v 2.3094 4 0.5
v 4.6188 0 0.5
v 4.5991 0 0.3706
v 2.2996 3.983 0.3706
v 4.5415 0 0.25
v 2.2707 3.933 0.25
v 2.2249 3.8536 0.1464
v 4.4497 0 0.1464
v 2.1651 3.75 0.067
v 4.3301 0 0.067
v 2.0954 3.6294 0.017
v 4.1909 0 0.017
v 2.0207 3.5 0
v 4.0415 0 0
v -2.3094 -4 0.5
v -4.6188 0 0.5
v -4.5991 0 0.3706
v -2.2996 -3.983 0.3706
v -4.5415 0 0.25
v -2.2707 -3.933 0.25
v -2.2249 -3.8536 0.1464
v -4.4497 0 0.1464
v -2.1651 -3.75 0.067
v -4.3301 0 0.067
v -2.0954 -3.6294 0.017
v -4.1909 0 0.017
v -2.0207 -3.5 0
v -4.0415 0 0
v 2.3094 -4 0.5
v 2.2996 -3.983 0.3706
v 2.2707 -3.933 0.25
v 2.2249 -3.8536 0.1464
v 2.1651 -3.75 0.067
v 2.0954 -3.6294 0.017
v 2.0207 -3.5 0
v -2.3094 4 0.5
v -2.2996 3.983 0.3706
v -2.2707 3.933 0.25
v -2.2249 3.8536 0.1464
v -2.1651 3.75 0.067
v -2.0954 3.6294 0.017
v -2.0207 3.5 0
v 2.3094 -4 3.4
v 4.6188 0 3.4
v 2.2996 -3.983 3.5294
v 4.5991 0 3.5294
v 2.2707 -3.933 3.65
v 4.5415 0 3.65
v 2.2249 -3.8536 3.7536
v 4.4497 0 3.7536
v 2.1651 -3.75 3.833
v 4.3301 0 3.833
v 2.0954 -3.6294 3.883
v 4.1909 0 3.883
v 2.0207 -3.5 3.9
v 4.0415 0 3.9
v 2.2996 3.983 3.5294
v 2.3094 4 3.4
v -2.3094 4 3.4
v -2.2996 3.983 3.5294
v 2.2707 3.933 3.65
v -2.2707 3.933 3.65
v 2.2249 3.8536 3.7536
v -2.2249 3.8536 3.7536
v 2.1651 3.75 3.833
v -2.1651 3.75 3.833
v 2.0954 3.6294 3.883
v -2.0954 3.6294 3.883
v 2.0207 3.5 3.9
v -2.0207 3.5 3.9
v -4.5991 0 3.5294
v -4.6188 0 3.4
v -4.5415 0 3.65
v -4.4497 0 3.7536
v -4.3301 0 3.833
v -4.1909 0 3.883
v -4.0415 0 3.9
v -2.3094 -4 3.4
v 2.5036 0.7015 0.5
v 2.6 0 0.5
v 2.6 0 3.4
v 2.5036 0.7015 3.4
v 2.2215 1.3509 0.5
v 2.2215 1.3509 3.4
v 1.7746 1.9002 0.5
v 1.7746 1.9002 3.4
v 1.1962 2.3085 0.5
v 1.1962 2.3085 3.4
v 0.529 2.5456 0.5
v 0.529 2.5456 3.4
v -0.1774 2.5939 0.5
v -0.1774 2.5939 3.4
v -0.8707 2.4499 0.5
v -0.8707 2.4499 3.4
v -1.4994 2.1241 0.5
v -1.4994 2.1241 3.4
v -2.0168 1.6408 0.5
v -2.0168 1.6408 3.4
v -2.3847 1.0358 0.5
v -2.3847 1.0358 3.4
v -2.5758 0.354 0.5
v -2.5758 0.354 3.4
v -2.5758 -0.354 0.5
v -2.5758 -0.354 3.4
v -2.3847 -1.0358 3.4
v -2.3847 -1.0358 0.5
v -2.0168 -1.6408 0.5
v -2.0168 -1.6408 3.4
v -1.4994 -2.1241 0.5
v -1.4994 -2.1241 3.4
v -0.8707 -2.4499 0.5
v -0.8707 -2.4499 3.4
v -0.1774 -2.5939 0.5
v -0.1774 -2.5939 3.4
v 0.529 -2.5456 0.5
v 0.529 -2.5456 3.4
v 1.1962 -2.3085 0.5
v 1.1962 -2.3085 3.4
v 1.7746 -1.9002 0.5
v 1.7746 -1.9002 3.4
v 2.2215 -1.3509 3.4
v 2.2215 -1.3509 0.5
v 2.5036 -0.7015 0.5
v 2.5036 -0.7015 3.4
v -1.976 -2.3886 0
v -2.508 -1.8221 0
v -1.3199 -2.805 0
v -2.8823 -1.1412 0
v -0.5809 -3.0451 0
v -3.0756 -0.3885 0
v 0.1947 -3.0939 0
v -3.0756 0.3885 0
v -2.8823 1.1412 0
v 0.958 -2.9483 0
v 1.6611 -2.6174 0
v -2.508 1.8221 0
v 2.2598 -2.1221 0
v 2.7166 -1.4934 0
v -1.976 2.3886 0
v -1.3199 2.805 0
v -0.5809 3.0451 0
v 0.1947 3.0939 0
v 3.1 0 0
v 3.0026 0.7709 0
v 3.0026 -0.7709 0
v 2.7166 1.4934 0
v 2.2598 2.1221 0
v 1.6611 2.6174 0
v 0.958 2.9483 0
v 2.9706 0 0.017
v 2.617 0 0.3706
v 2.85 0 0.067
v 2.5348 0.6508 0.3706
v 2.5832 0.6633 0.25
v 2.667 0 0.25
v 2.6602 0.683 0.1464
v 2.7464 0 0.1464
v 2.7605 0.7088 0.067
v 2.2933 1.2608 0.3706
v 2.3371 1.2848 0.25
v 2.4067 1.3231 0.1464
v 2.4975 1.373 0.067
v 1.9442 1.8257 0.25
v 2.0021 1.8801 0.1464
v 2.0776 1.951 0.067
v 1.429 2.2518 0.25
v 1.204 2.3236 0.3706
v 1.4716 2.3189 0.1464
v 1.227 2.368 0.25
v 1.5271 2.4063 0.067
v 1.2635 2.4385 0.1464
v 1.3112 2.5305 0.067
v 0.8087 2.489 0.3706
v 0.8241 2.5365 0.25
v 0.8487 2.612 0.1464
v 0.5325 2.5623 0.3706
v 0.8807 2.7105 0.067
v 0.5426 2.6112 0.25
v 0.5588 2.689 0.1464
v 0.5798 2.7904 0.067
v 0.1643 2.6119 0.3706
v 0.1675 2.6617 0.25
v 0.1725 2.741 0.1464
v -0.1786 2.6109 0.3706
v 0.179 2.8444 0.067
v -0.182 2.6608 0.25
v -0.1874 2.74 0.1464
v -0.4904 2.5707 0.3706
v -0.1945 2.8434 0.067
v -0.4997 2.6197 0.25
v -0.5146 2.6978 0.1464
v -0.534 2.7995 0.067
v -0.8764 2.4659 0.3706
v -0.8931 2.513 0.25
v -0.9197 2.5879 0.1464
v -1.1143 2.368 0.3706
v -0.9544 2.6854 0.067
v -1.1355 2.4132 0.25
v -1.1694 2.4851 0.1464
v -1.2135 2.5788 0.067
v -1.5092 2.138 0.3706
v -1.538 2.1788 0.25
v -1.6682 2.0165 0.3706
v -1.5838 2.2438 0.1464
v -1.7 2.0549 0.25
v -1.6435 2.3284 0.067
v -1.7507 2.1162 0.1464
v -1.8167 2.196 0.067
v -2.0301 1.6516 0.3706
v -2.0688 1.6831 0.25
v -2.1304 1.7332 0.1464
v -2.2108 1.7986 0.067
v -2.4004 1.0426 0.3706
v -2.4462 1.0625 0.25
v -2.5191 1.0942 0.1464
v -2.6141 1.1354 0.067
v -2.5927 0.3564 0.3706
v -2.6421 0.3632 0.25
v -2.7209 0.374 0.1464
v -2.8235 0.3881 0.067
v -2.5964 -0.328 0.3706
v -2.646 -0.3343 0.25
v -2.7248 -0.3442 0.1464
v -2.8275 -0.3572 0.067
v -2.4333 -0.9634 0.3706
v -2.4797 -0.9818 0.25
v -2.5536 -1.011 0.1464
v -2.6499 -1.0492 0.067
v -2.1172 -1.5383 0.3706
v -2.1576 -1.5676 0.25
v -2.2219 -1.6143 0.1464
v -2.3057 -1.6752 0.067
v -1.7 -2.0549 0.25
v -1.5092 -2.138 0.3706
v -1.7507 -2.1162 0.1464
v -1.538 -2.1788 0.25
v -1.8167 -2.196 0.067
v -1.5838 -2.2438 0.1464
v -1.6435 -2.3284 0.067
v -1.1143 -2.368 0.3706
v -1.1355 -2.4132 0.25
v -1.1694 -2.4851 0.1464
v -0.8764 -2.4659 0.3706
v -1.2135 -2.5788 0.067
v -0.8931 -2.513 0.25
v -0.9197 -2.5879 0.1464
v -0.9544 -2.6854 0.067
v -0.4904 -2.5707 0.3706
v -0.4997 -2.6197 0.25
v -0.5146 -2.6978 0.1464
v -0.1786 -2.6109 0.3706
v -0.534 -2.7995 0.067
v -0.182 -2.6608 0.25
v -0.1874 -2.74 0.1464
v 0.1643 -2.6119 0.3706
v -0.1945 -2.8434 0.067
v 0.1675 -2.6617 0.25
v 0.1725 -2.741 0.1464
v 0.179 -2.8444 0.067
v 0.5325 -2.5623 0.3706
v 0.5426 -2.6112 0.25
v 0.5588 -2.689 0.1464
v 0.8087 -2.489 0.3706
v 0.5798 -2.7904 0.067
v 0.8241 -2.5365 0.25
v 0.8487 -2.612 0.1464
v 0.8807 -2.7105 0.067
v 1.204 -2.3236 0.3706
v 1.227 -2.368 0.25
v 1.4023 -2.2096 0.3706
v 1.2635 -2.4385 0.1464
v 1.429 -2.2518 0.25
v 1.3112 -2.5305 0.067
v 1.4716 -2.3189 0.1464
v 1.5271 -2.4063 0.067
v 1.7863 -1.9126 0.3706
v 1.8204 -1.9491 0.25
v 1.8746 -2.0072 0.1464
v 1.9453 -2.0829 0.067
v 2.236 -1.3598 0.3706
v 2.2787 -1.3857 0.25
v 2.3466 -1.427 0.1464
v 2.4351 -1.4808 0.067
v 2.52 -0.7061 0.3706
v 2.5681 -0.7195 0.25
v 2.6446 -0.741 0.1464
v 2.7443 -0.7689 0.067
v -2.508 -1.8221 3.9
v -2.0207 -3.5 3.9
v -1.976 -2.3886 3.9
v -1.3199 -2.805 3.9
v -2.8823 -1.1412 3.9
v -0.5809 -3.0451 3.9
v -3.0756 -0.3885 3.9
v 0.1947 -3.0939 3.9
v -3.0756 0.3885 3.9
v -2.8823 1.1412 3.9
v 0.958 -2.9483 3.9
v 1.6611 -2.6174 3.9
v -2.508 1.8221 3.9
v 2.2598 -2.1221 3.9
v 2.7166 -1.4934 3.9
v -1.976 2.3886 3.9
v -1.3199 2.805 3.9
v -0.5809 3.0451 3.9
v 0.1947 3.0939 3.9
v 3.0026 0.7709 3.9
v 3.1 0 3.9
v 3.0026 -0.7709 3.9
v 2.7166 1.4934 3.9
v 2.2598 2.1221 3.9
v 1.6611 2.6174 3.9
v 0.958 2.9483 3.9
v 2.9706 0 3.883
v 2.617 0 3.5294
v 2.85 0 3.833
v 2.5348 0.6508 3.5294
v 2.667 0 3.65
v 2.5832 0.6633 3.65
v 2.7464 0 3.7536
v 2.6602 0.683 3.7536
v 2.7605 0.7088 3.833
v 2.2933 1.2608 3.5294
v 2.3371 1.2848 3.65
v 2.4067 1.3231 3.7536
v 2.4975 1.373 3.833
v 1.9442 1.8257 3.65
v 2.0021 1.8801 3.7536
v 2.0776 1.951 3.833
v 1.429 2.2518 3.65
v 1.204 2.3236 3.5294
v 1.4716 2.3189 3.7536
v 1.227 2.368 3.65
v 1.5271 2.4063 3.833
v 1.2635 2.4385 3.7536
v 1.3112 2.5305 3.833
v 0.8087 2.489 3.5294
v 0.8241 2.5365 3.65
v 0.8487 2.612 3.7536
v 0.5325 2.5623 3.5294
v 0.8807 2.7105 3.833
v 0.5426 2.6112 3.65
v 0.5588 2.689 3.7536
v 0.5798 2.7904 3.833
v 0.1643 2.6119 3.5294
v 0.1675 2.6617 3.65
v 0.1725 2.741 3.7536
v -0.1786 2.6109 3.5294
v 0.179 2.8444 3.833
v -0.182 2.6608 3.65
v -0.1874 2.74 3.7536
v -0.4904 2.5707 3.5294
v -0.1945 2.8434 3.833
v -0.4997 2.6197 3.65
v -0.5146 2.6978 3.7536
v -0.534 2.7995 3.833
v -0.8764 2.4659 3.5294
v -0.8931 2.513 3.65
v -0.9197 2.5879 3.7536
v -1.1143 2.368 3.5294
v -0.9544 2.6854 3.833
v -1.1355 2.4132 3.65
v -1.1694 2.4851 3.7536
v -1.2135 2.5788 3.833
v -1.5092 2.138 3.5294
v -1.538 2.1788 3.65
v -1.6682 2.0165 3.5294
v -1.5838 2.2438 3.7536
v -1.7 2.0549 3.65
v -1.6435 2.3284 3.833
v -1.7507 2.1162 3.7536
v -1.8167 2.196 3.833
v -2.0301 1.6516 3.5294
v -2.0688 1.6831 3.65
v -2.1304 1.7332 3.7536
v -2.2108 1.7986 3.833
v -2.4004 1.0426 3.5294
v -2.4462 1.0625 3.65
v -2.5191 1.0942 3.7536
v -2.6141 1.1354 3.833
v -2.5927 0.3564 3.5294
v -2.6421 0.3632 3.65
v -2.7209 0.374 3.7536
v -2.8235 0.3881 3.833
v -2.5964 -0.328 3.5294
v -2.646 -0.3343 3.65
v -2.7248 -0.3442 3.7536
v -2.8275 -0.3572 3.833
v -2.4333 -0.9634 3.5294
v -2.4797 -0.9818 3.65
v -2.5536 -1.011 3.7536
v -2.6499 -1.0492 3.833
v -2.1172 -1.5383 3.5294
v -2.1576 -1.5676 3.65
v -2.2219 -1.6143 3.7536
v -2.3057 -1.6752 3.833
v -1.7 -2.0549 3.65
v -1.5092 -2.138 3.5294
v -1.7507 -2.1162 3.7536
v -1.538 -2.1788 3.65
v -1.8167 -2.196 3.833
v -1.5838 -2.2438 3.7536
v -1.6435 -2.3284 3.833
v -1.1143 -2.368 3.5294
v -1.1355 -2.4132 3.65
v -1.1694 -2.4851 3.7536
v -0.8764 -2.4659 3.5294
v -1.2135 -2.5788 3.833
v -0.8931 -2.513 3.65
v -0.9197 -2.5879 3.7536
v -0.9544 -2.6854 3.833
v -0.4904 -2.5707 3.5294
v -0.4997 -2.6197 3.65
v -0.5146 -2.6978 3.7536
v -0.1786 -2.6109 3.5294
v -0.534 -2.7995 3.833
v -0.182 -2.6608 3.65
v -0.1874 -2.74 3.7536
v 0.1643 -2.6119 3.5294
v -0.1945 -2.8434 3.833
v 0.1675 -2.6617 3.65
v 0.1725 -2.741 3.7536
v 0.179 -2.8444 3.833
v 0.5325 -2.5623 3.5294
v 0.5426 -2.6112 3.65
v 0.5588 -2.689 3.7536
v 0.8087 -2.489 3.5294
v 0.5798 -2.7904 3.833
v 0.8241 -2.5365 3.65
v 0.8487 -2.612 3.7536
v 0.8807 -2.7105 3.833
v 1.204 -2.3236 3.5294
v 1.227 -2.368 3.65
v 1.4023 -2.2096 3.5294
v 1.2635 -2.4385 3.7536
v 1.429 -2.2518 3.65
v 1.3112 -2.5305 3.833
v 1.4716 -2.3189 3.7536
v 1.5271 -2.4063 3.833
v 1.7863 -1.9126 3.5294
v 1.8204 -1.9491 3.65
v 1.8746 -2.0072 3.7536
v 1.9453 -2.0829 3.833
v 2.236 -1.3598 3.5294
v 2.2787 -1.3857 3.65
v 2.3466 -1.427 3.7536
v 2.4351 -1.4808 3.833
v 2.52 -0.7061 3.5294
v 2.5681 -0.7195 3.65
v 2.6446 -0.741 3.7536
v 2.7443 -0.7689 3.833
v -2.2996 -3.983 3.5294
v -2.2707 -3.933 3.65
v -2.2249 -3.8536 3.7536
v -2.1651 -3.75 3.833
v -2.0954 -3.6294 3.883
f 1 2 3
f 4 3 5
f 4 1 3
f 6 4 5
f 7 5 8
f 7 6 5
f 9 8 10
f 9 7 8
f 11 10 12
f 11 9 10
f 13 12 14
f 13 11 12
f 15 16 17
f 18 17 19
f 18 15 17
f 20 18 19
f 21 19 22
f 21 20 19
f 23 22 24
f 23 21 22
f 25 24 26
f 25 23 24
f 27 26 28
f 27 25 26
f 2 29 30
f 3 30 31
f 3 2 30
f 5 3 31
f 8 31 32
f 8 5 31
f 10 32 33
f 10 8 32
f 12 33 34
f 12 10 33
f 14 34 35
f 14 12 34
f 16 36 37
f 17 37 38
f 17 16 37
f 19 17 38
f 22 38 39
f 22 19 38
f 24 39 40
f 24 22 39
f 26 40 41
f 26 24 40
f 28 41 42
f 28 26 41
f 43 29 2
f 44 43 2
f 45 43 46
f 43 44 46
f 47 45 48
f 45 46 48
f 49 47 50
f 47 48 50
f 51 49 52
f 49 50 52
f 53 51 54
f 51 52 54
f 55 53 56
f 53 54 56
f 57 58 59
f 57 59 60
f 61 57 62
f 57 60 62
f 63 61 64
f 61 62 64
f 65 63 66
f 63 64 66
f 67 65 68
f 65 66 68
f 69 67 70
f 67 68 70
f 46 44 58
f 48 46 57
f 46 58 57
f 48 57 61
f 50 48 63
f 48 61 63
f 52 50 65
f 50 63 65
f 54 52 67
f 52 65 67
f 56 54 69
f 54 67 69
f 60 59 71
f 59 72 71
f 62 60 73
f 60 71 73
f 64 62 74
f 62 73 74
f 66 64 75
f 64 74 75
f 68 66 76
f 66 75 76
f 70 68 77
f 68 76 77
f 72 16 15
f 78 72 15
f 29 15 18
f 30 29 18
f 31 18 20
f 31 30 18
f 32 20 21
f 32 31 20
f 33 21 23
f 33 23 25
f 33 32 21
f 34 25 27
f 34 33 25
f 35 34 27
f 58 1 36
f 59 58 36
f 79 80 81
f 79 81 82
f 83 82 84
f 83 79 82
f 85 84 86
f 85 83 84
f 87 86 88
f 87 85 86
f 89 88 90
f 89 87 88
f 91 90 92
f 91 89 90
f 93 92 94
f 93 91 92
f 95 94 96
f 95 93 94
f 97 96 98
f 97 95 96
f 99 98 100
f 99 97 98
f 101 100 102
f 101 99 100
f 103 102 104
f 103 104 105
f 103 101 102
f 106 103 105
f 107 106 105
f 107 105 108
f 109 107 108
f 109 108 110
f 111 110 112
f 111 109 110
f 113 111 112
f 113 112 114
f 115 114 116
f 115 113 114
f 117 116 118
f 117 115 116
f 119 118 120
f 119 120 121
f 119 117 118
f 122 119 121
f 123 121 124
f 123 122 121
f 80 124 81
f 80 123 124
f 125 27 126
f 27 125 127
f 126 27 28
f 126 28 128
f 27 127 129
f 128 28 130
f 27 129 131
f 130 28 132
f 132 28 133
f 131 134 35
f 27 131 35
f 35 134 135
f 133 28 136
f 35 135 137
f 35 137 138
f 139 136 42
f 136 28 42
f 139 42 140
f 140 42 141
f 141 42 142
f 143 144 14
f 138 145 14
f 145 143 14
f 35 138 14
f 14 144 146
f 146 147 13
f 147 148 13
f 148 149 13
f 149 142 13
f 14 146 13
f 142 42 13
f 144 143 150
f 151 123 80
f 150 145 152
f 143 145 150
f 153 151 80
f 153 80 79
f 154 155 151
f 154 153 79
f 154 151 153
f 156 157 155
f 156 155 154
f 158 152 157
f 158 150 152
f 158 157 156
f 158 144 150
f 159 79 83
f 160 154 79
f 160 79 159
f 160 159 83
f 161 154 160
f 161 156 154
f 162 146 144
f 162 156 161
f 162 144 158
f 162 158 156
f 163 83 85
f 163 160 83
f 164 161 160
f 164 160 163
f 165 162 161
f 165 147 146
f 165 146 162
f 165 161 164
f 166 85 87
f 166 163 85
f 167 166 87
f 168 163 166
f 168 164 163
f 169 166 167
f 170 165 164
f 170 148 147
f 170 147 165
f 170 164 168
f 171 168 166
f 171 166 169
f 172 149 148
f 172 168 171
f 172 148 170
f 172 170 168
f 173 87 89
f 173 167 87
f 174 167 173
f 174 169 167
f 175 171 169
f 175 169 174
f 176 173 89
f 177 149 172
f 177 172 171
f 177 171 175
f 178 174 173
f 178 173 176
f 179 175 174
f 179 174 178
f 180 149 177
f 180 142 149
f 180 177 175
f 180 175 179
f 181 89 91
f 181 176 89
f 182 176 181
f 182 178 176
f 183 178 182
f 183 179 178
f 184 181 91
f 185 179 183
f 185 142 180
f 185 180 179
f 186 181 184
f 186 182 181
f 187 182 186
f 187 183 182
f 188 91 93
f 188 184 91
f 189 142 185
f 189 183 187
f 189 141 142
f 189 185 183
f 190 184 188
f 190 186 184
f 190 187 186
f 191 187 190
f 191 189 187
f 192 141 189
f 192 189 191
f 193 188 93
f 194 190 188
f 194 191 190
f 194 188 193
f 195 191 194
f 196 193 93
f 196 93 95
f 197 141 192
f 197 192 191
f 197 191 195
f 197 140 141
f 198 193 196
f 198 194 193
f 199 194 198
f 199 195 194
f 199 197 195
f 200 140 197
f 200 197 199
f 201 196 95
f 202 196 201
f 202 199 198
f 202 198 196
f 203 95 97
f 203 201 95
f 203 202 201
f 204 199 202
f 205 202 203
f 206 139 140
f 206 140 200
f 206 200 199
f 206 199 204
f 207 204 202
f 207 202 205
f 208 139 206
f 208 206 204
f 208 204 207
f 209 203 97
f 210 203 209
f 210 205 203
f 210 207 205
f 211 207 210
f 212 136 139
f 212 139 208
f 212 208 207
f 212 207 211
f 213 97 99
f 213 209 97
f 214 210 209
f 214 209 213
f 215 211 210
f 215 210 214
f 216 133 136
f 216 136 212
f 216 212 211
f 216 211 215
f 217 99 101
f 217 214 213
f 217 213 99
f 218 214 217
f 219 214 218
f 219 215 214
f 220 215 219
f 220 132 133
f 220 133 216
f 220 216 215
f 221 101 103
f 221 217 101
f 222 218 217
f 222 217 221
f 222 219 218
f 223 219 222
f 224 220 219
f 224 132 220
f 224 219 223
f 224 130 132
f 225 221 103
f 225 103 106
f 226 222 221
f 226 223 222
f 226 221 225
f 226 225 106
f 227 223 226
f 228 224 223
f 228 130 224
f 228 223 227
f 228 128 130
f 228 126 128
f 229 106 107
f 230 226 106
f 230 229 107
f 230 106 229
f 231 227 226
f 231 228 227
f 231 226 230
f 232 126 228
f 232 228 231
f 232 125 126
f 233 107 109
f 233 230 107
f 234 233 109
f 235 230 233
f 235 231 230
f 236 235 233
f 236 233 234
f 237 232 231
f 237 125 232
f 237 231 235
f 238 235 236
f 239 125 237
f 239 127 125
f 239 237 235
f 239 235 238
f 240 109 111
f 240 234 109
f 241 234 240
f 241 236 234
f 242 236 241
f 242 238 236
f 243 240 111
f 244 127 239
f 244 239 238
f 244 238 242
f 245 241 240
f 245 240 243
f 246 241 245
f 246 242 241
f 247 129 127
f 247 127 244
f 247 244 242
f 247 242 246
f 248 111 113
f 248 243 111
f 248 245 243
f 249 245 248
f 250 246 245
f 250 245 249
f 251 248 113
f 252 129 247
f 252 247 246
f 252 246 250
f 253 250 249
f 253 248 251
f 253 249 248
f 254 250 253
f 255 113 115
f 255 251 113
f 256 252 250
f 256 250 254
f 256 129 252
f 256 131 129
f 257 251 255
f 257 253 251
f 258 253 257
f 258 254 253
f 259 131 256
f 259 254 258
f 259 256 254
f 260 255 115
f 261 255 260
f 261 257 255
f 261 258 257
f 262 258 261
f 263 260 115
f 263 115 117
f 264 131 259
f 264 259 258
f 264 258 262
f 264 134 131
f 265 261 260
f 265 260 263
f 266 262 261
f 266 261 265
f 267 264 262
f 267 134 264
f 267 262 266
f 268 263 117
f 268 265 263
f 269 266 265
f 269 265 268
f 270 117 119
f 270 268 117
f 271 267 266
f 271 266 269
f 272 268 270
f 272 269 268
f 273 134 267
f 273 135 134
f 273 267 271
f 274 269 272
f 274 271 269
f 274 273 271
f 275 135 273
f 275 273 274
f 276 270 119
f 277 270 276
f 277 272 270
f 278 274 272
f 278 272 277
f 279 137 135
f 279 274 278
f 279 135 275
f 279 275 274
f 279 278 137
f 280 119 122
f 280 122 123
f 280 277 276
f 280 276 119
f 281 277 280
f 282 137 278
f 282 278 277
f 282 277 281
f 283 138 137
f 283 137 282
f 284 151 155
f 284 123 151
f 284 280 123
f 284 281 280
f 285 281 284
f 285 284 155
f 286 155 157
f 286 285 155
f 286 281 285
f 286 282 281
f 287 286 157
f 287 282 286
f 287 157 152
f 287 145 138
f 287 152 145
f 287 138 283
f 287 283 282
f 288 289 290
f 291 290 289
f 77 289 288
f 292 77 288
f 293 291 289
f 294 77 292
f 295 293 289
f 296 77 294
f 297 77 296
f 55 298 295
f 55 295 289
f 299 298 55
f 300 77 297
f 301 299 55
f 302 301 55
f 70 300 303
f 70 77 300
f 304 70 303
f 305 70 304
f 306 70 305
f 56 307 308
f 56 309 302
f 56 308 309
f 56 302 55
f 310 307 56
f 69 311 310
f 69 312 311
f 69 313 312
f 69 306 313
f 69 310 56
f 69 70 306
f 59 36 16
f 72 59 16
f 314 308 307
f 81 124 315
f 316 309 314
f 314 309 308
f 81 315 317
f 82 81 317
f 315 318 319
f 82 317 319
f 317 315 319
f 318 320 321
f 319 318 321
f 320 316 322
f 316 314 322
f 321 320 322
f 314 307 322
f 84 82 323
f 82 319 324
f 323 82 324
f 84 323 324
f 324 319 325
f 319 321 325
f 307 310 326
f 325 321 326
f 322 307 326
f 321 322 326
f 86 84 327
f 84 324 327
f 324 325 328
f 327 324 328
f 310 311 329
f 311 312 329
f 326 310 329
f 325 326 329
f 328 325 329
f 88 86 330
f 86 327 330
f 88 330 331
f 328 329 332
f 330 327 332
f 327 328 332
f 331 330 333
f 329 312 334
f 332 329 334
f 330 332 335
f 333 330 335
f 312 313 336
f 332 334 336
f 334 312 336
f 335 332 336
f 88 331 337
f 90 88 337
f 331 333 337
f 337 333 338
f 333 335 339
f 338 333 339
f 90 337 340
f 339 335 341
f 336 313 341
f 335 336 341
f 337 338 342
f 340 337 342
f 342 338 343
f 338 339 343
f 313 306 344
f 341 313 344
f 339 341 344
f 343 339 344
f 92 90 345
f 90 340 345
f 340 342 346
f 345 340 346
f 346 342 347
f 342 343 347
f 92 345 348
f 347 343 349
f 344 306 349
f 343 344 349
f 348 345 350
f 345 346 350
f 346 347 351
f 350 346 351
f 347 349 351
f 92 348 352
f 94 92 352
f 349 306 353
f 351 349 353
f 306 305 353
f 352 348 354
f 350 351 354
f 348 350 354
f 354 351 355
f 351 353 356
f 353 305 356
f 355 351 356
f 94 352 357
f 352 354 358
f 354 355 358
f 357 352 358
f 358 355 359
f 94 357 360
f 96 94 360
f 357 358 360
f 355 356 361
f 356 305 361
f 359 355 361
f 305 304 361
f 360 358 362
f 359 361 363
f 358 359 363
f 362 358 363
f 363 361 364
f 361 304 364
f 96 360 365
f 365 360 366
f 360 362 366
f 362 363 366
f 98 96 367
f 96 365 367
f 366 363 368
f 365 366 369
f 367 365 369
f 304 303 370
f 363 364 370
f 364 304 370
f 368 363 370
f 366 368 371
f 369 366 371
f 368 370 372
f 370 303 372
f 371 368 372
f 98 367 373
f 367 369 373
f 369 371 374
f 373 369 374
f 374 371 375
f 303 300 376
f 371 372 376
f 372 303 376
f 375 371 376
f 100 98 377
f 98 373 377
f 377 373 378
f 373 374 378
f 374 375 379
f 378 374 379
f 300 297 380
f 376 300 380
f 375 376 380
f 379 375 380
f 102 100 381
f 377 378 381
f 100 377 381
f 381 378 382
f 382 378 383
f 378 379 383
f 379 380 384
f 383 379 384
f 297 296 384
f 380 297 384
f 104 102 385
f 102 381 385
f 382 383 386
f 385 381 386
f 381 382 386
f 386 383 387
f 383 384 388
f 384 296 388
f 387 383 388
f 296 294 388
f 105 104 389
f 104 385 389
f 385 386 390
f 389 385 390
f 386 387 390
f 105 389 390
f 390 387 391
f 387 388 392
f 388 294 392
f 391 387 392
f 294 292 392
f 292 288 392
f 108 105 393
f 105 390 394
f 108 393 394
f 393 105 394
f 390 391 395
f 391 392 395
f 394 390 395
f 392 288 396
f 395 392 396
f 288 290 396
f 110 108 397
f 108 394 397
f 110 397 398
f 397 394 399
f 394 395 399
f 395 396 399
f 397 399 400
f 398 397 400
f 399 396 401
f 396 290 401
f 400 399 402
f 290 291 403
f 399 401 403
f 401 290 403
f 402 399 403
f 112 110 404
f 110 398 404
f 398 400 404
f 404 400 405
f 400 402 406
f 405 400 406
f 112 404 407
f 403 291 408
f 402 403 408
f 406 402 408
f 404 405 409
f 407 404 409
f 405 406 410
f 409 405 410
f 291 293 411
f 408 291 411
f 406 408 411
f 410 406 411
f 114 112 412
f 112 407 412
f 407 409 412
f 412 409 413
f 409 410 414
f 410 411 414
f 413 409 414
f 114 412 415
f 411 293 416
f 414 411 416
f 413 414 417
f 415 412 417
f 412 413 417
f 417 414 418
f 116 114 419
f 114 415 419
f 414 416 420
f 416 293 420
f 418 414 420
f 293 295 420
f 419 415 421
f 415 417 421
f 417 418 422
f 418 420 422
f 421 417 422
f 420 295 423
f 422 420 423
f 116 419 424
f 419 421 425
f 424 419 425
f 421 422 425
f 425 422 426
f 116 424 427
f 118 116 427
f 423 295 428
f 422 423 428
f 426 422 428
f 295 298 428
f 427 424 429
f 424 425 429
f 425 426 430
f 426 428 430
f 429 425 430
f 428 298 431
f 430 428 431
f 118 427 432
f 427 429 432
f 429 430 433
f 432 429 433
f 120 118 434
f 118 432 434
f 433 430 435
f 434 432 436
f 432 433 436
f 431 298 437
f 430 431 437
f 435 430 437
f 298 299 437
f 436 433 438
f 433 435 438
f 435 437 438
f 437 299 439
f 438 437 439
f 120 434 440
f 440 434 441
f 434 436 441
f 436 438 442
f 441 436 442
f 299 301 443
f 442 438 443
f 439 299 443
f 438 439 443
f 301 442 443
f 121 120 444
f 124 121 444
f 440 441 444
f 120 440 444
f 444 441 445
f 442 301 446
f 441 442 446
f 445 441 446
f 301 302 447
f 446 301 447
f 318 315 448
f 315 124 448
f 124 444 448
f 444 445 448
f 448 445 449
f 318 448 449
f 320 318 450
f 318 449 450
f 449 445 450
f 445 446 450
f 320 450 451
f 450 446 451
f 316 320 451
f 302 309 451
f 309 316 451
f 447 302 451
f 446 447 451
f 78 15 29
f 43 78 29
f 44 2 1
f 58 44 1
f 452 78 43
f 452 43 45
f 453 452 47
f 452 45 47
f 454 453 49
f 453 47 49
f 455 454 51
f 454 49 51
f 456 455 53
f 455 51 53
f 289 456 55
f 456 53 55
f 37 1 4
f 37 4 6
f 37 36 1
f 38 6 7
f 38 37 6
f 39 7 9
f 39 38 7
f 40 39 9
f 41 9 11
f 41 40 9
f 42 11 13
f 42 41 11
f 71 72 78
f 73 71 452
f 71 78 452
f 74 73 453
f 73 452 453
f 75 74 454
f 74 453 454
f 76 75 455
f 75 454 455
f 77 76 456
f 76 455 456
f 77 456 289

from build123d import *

# Parameters (mm, degrees)
SKETCH_1_R      = 2.6
EXTRUDE_1_DEPTH = 3.9
FILLET_1_R      = 0.5


with BuildPart() as part:
    # 草图1 → 凸台-拉伸1 (new body)
    with BuildSketch(Plane.XY):
        Polygon((4.618802154, 0), (2.309401077, 4), (-2.309401077, 4), (-4.618802154, 0), (-2.309401077, -4), (2.309401077, -4), align=None)
        Circle(SKETCH_1_R, mode=Mode.SUBTRACT)
    extrude(amount=EXTRUDE_1_DEPTH)

    # 圆角1
    fillet_1_edges = [part.edges().sort_by_distance(p)[0] for p in [
        (0, 4, 3.9),
        (-3.464101615, 2, 3.9),
        (-2.6, 0, 0),
        (-2.6, 0, 3.9),
        (-3.464101615, -2, 3.9),
        (0, -4, 3.9),
        (3.464101615, -2, 3.9),
        (0, -4, 0),
        (-3.464101615, -2, 0),
        (-3.464101615, 2, 0),
        (0, 4, 0),
        (3.464101615, 2, 0),
        (3.464101615, -2, 0),
        (3.464101615, 2, 3.9),
    ]]
    fillet(fillet_1_edges, radius=FILLET_1_R)


solid = part.part
